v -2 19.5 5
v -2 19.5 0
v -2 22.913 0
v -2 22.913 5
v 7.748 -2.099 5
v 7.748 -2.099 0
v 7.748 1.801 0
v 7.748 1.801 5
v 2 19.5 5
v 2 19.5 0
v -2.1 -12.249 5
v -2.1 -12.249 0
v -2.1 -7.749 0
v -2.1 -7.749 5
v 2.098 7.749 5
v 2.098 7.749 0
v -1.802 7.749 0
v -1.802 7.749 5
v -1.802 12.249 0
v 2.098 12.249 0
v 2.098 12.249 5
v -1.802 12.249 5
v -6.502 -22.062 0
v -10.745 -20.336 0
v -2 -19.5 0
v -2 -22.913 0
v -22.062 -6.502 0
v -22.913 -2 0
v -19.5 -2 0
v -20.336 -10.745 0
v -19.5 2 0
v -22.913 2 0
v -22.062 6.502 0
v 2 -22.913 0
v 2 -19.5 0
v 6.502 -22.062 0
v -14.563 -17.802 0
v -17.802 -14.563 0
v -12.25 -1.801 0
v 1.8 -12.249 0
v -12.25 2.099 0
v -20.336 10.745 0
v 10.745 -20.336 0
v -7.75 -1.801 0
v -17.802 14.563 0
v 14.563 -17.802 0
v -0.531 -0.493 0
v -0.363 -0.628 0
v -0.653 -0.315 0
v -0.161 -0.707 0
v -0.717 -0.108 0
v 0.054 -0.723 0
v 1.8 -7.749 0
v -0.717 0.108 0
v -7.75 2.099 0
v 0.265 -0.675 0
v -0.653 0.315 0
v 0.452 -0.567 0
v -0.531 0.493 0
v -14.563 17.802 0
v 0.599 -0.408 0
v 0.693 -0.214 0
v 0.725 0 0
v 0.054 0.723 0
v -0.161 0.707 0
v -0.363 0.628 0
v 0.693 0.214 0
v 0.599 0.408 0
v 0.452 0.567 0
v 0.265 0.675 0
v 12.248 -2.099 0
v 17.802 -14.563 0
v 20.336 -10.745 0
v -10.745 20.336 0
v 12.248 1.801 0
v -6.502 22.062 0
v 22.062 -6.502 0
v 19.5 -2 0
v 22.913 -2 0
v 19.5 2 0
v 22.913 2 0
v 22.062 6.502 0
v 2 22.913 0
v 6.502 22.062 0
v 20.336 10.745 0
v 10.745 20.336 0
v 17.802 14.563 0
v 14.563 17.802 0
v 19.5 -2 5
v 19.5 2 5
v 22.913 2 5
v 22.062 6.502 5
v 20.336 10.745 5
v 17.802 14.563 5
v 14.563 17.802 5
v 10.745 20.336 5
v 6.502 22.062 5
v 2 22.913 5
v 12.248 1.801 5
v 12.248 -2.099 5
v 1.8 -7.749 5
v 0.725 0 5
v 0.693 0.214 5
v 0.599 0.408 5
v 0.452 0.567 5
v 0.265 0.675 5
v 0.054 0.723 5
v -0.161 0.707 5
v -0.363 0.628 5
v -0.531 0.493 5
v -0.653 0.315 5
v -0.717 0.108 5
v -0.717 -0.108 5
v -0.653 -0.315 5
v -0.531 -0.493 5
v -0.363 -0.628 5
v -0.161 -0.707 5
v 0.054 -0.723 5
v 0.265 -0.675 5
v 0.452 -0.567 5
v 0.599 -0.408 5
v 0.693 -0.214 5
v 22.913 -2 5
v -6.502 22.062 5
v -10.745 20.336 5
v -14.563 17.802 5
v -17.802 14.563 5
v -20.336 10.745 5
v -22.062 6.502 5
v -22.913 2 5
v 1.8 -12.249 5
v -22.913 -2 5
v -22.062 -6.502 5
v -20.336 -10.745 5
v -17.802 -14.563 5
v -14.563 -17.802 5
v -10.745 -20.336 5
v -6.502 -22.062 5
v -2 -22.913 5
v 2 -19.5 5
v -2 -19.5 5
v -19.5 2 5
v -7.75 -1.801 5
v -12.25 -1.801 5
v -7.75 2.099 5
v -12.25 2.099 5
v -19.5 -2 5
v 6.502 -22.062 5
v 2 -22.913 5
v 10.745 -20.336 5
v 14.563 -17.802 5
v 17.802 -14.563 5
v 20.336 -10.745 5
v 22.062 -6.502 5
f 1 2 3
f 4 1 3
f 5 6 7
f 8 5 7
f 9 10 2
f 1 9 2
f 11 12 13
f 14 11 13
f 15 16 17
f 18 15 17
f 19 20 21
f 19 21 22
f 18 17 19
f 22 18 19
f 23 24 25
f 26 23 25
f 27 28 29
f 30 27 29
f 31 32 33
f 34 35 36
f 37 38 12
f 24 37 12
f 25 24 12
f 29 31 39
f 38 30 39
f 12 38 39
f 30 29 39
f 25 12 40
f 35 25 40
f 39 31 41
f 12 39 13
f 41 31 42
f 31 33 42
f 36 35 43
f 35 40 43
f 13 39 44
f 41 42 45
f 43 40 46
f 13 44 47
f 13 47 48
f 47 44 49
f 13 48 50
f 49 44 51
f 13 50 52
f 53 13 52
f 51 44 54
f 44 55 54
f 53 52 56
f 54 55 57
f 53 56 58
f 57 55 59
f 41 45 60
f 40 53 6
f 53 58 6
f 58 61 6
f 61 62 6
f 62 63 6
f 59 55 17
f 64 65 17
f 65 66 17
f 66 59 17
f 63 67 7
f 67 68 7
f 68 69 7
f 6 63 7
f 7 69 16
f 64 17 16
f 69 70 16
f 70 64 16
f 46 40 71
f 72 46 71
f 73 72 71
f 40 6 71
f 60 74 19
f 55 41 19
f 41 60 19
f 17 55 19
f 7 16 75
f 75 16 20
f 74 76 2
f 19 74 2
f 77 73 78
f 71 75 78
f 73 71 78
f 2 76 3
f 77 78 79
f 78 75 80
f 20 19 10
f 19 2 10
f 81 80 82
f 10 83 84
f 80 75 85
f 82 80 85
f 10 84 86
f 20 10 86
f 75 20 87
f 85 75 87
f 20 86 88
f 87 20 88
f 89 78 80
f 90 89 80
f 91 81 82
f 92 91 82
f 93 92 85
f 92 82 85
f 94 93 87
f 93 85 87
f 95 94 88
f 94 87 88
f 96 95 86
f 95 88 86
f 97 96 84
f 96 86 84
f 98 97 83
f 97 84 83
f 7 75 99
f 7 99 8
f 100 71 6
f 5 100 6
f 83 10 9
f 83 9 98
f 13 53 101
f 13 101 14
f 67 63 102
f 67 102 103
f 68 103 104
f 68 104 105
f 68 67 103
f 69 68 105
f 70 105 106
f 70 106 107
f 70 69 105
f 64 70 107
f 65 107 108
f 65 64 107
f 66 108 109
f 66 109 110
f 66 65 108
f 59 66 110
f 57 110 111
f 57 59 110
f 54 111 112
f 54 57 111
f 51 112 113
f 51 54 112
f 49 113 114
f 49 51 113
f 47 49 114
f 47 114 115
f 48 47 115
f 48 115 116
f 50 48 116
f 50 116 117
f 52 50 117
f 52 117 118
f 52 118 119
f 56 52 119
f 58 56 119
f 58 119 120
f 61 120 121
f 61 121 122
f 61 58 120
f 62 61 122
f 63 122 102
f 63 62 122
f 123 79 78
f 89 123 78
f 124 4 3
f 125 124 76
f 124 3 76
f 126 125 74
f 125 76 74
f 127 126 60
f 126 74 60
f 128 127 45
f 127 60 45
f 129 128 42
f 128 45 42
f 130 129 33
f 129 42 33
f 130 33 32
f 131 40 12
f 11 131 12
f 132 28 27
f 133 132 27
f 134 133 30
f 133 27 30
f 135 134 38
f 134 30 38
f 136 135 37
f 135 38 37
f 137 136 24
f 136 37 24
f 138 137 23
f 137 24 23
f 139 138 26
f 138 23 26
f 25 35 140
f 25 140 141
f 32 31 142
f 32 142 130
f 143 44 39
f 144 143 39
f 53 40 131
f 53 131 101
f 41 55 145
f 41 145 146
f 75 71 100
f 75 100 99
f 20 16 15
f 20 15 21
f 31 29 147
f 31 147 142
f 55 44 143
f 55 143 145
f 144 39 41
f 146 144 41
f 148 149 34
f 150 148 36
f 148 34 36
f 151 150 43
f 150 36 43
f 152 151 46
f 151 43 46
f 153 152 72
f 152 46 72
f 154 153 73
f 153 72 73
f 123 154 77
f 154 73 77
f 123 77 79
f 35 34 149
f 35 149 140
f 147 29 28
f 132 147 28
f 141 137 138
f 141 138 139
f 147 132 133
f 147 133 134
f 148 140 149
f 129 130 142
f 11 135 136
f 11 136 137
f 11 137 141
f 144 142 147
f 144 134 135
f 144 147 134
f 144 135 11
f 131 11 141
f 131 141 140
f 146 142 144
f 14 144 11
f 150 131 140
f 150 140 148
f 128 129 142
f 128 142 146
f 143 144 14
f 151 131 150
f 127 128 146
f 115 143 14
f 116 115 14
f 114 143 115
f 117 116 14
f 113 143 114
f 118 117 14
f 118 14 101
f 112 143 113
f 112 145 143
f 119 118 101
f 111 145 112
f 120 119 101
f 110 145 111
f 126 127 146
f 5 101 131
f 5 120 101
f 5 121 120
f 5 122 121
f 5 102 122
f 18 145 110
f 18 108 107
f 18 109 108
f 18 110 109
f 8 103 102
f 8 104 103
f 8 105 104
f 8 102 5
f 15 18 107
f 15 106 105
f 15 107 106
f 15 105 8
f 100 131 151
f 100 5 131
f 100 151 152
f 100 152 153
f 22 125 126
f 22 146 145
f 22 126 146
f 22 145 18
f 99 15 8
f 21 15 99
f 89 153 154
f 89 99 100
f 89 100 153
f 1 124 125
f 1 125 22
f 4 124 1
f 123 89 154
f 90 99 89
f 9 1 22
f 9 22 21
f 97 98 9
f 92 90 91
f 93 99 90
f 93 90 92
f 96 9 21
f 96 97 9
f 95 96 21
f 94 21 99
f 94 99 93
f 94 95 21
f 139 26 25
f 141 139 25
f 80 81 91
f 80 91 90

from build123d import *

# Parameters (mm, degrees)
SKETCH1_R           = 23
SKETCH1_R_2         = 0.725
BOSS_EXTRUDE1_DEPTH = 5
SKETCH2_W           = 4.5
SKETCH2_H           = 3.9
SKETCH2_W_2         = 3.9
SKETCH2_H_2         = 4.5
CUT_EXTRUDE1_DEPTH  = 6
SKETCH3_W           = 7
SKETCH3_H           = 4
SKETCH3_W_2         = 4
SKETCH3_H_2         = 7
CUT_EXTRUDE2_DEPTH  = 6


with BuildPart() as part:
    # Sketch1 → Boss-Extrude1 (new body)
    with BuildSketch(Plane.XY):
        Circle(SKETCH1_R)
        Circle(SKETCH1_R_2, mode=Mode.SUBTRACT)
    extrude(amount=BOSS_EXTRUDE1_DEPTH)

    # Sketch2 → Cut-Extrude1 (cut, through all)
    with BuildSketch(Plane(origin=(0, 0, 0), x_dir=(-1, 0, 0), z_dir=(0, 0, -1))):
        with Locations((9.999907629, 0.148804685)):
            Rectangle(SKETCH2_W, SKETCH2_H)
        with Locations((-0.147804685, 9.998907629)):
            Rectangle(SKETCH2_W_2, SKETCH2_H_2)
        with Locations((0.149804685, -9.998907629)):
            Rectangle(SKETCH2_W_2, SKETCH2_H_2)
        with Locations((-9.997907629, -0.148804685)):
            Rectangle(SKETCH2_W, SKETCH2_H)
    extrude(amount=-CUT_EXTRUDE1_DEPTH, mode=Mode.SUBTRACT)

    # Sketch3 → Cut-Extrude2 (cut, through all)
    with BuildSketch(Plane(origin=(0, 0, 0), x_dir=(-1, 0, 0), z_dir=(0, 0, -1))):
        with Locations((23, 0)):
            Rectangle(SKETCH3_W, SKETCH3_H)
        with Locations((0, 23)):
            Rectangle(SKETCH3_W_2, SKETCH3_H_2)
        with Locations((0, -23)):
            Rectangle(SKETCH3_W_2, SKETCH3_H_2)
        with Locations((-23, 0)):
            Rectangle(SKETCH3_W, SKETCH3_H)
    extrude(amount=-CUT_EXTRUDE2_DEPTH, mode=Mode.SUBTRACT)


solid = part.part
